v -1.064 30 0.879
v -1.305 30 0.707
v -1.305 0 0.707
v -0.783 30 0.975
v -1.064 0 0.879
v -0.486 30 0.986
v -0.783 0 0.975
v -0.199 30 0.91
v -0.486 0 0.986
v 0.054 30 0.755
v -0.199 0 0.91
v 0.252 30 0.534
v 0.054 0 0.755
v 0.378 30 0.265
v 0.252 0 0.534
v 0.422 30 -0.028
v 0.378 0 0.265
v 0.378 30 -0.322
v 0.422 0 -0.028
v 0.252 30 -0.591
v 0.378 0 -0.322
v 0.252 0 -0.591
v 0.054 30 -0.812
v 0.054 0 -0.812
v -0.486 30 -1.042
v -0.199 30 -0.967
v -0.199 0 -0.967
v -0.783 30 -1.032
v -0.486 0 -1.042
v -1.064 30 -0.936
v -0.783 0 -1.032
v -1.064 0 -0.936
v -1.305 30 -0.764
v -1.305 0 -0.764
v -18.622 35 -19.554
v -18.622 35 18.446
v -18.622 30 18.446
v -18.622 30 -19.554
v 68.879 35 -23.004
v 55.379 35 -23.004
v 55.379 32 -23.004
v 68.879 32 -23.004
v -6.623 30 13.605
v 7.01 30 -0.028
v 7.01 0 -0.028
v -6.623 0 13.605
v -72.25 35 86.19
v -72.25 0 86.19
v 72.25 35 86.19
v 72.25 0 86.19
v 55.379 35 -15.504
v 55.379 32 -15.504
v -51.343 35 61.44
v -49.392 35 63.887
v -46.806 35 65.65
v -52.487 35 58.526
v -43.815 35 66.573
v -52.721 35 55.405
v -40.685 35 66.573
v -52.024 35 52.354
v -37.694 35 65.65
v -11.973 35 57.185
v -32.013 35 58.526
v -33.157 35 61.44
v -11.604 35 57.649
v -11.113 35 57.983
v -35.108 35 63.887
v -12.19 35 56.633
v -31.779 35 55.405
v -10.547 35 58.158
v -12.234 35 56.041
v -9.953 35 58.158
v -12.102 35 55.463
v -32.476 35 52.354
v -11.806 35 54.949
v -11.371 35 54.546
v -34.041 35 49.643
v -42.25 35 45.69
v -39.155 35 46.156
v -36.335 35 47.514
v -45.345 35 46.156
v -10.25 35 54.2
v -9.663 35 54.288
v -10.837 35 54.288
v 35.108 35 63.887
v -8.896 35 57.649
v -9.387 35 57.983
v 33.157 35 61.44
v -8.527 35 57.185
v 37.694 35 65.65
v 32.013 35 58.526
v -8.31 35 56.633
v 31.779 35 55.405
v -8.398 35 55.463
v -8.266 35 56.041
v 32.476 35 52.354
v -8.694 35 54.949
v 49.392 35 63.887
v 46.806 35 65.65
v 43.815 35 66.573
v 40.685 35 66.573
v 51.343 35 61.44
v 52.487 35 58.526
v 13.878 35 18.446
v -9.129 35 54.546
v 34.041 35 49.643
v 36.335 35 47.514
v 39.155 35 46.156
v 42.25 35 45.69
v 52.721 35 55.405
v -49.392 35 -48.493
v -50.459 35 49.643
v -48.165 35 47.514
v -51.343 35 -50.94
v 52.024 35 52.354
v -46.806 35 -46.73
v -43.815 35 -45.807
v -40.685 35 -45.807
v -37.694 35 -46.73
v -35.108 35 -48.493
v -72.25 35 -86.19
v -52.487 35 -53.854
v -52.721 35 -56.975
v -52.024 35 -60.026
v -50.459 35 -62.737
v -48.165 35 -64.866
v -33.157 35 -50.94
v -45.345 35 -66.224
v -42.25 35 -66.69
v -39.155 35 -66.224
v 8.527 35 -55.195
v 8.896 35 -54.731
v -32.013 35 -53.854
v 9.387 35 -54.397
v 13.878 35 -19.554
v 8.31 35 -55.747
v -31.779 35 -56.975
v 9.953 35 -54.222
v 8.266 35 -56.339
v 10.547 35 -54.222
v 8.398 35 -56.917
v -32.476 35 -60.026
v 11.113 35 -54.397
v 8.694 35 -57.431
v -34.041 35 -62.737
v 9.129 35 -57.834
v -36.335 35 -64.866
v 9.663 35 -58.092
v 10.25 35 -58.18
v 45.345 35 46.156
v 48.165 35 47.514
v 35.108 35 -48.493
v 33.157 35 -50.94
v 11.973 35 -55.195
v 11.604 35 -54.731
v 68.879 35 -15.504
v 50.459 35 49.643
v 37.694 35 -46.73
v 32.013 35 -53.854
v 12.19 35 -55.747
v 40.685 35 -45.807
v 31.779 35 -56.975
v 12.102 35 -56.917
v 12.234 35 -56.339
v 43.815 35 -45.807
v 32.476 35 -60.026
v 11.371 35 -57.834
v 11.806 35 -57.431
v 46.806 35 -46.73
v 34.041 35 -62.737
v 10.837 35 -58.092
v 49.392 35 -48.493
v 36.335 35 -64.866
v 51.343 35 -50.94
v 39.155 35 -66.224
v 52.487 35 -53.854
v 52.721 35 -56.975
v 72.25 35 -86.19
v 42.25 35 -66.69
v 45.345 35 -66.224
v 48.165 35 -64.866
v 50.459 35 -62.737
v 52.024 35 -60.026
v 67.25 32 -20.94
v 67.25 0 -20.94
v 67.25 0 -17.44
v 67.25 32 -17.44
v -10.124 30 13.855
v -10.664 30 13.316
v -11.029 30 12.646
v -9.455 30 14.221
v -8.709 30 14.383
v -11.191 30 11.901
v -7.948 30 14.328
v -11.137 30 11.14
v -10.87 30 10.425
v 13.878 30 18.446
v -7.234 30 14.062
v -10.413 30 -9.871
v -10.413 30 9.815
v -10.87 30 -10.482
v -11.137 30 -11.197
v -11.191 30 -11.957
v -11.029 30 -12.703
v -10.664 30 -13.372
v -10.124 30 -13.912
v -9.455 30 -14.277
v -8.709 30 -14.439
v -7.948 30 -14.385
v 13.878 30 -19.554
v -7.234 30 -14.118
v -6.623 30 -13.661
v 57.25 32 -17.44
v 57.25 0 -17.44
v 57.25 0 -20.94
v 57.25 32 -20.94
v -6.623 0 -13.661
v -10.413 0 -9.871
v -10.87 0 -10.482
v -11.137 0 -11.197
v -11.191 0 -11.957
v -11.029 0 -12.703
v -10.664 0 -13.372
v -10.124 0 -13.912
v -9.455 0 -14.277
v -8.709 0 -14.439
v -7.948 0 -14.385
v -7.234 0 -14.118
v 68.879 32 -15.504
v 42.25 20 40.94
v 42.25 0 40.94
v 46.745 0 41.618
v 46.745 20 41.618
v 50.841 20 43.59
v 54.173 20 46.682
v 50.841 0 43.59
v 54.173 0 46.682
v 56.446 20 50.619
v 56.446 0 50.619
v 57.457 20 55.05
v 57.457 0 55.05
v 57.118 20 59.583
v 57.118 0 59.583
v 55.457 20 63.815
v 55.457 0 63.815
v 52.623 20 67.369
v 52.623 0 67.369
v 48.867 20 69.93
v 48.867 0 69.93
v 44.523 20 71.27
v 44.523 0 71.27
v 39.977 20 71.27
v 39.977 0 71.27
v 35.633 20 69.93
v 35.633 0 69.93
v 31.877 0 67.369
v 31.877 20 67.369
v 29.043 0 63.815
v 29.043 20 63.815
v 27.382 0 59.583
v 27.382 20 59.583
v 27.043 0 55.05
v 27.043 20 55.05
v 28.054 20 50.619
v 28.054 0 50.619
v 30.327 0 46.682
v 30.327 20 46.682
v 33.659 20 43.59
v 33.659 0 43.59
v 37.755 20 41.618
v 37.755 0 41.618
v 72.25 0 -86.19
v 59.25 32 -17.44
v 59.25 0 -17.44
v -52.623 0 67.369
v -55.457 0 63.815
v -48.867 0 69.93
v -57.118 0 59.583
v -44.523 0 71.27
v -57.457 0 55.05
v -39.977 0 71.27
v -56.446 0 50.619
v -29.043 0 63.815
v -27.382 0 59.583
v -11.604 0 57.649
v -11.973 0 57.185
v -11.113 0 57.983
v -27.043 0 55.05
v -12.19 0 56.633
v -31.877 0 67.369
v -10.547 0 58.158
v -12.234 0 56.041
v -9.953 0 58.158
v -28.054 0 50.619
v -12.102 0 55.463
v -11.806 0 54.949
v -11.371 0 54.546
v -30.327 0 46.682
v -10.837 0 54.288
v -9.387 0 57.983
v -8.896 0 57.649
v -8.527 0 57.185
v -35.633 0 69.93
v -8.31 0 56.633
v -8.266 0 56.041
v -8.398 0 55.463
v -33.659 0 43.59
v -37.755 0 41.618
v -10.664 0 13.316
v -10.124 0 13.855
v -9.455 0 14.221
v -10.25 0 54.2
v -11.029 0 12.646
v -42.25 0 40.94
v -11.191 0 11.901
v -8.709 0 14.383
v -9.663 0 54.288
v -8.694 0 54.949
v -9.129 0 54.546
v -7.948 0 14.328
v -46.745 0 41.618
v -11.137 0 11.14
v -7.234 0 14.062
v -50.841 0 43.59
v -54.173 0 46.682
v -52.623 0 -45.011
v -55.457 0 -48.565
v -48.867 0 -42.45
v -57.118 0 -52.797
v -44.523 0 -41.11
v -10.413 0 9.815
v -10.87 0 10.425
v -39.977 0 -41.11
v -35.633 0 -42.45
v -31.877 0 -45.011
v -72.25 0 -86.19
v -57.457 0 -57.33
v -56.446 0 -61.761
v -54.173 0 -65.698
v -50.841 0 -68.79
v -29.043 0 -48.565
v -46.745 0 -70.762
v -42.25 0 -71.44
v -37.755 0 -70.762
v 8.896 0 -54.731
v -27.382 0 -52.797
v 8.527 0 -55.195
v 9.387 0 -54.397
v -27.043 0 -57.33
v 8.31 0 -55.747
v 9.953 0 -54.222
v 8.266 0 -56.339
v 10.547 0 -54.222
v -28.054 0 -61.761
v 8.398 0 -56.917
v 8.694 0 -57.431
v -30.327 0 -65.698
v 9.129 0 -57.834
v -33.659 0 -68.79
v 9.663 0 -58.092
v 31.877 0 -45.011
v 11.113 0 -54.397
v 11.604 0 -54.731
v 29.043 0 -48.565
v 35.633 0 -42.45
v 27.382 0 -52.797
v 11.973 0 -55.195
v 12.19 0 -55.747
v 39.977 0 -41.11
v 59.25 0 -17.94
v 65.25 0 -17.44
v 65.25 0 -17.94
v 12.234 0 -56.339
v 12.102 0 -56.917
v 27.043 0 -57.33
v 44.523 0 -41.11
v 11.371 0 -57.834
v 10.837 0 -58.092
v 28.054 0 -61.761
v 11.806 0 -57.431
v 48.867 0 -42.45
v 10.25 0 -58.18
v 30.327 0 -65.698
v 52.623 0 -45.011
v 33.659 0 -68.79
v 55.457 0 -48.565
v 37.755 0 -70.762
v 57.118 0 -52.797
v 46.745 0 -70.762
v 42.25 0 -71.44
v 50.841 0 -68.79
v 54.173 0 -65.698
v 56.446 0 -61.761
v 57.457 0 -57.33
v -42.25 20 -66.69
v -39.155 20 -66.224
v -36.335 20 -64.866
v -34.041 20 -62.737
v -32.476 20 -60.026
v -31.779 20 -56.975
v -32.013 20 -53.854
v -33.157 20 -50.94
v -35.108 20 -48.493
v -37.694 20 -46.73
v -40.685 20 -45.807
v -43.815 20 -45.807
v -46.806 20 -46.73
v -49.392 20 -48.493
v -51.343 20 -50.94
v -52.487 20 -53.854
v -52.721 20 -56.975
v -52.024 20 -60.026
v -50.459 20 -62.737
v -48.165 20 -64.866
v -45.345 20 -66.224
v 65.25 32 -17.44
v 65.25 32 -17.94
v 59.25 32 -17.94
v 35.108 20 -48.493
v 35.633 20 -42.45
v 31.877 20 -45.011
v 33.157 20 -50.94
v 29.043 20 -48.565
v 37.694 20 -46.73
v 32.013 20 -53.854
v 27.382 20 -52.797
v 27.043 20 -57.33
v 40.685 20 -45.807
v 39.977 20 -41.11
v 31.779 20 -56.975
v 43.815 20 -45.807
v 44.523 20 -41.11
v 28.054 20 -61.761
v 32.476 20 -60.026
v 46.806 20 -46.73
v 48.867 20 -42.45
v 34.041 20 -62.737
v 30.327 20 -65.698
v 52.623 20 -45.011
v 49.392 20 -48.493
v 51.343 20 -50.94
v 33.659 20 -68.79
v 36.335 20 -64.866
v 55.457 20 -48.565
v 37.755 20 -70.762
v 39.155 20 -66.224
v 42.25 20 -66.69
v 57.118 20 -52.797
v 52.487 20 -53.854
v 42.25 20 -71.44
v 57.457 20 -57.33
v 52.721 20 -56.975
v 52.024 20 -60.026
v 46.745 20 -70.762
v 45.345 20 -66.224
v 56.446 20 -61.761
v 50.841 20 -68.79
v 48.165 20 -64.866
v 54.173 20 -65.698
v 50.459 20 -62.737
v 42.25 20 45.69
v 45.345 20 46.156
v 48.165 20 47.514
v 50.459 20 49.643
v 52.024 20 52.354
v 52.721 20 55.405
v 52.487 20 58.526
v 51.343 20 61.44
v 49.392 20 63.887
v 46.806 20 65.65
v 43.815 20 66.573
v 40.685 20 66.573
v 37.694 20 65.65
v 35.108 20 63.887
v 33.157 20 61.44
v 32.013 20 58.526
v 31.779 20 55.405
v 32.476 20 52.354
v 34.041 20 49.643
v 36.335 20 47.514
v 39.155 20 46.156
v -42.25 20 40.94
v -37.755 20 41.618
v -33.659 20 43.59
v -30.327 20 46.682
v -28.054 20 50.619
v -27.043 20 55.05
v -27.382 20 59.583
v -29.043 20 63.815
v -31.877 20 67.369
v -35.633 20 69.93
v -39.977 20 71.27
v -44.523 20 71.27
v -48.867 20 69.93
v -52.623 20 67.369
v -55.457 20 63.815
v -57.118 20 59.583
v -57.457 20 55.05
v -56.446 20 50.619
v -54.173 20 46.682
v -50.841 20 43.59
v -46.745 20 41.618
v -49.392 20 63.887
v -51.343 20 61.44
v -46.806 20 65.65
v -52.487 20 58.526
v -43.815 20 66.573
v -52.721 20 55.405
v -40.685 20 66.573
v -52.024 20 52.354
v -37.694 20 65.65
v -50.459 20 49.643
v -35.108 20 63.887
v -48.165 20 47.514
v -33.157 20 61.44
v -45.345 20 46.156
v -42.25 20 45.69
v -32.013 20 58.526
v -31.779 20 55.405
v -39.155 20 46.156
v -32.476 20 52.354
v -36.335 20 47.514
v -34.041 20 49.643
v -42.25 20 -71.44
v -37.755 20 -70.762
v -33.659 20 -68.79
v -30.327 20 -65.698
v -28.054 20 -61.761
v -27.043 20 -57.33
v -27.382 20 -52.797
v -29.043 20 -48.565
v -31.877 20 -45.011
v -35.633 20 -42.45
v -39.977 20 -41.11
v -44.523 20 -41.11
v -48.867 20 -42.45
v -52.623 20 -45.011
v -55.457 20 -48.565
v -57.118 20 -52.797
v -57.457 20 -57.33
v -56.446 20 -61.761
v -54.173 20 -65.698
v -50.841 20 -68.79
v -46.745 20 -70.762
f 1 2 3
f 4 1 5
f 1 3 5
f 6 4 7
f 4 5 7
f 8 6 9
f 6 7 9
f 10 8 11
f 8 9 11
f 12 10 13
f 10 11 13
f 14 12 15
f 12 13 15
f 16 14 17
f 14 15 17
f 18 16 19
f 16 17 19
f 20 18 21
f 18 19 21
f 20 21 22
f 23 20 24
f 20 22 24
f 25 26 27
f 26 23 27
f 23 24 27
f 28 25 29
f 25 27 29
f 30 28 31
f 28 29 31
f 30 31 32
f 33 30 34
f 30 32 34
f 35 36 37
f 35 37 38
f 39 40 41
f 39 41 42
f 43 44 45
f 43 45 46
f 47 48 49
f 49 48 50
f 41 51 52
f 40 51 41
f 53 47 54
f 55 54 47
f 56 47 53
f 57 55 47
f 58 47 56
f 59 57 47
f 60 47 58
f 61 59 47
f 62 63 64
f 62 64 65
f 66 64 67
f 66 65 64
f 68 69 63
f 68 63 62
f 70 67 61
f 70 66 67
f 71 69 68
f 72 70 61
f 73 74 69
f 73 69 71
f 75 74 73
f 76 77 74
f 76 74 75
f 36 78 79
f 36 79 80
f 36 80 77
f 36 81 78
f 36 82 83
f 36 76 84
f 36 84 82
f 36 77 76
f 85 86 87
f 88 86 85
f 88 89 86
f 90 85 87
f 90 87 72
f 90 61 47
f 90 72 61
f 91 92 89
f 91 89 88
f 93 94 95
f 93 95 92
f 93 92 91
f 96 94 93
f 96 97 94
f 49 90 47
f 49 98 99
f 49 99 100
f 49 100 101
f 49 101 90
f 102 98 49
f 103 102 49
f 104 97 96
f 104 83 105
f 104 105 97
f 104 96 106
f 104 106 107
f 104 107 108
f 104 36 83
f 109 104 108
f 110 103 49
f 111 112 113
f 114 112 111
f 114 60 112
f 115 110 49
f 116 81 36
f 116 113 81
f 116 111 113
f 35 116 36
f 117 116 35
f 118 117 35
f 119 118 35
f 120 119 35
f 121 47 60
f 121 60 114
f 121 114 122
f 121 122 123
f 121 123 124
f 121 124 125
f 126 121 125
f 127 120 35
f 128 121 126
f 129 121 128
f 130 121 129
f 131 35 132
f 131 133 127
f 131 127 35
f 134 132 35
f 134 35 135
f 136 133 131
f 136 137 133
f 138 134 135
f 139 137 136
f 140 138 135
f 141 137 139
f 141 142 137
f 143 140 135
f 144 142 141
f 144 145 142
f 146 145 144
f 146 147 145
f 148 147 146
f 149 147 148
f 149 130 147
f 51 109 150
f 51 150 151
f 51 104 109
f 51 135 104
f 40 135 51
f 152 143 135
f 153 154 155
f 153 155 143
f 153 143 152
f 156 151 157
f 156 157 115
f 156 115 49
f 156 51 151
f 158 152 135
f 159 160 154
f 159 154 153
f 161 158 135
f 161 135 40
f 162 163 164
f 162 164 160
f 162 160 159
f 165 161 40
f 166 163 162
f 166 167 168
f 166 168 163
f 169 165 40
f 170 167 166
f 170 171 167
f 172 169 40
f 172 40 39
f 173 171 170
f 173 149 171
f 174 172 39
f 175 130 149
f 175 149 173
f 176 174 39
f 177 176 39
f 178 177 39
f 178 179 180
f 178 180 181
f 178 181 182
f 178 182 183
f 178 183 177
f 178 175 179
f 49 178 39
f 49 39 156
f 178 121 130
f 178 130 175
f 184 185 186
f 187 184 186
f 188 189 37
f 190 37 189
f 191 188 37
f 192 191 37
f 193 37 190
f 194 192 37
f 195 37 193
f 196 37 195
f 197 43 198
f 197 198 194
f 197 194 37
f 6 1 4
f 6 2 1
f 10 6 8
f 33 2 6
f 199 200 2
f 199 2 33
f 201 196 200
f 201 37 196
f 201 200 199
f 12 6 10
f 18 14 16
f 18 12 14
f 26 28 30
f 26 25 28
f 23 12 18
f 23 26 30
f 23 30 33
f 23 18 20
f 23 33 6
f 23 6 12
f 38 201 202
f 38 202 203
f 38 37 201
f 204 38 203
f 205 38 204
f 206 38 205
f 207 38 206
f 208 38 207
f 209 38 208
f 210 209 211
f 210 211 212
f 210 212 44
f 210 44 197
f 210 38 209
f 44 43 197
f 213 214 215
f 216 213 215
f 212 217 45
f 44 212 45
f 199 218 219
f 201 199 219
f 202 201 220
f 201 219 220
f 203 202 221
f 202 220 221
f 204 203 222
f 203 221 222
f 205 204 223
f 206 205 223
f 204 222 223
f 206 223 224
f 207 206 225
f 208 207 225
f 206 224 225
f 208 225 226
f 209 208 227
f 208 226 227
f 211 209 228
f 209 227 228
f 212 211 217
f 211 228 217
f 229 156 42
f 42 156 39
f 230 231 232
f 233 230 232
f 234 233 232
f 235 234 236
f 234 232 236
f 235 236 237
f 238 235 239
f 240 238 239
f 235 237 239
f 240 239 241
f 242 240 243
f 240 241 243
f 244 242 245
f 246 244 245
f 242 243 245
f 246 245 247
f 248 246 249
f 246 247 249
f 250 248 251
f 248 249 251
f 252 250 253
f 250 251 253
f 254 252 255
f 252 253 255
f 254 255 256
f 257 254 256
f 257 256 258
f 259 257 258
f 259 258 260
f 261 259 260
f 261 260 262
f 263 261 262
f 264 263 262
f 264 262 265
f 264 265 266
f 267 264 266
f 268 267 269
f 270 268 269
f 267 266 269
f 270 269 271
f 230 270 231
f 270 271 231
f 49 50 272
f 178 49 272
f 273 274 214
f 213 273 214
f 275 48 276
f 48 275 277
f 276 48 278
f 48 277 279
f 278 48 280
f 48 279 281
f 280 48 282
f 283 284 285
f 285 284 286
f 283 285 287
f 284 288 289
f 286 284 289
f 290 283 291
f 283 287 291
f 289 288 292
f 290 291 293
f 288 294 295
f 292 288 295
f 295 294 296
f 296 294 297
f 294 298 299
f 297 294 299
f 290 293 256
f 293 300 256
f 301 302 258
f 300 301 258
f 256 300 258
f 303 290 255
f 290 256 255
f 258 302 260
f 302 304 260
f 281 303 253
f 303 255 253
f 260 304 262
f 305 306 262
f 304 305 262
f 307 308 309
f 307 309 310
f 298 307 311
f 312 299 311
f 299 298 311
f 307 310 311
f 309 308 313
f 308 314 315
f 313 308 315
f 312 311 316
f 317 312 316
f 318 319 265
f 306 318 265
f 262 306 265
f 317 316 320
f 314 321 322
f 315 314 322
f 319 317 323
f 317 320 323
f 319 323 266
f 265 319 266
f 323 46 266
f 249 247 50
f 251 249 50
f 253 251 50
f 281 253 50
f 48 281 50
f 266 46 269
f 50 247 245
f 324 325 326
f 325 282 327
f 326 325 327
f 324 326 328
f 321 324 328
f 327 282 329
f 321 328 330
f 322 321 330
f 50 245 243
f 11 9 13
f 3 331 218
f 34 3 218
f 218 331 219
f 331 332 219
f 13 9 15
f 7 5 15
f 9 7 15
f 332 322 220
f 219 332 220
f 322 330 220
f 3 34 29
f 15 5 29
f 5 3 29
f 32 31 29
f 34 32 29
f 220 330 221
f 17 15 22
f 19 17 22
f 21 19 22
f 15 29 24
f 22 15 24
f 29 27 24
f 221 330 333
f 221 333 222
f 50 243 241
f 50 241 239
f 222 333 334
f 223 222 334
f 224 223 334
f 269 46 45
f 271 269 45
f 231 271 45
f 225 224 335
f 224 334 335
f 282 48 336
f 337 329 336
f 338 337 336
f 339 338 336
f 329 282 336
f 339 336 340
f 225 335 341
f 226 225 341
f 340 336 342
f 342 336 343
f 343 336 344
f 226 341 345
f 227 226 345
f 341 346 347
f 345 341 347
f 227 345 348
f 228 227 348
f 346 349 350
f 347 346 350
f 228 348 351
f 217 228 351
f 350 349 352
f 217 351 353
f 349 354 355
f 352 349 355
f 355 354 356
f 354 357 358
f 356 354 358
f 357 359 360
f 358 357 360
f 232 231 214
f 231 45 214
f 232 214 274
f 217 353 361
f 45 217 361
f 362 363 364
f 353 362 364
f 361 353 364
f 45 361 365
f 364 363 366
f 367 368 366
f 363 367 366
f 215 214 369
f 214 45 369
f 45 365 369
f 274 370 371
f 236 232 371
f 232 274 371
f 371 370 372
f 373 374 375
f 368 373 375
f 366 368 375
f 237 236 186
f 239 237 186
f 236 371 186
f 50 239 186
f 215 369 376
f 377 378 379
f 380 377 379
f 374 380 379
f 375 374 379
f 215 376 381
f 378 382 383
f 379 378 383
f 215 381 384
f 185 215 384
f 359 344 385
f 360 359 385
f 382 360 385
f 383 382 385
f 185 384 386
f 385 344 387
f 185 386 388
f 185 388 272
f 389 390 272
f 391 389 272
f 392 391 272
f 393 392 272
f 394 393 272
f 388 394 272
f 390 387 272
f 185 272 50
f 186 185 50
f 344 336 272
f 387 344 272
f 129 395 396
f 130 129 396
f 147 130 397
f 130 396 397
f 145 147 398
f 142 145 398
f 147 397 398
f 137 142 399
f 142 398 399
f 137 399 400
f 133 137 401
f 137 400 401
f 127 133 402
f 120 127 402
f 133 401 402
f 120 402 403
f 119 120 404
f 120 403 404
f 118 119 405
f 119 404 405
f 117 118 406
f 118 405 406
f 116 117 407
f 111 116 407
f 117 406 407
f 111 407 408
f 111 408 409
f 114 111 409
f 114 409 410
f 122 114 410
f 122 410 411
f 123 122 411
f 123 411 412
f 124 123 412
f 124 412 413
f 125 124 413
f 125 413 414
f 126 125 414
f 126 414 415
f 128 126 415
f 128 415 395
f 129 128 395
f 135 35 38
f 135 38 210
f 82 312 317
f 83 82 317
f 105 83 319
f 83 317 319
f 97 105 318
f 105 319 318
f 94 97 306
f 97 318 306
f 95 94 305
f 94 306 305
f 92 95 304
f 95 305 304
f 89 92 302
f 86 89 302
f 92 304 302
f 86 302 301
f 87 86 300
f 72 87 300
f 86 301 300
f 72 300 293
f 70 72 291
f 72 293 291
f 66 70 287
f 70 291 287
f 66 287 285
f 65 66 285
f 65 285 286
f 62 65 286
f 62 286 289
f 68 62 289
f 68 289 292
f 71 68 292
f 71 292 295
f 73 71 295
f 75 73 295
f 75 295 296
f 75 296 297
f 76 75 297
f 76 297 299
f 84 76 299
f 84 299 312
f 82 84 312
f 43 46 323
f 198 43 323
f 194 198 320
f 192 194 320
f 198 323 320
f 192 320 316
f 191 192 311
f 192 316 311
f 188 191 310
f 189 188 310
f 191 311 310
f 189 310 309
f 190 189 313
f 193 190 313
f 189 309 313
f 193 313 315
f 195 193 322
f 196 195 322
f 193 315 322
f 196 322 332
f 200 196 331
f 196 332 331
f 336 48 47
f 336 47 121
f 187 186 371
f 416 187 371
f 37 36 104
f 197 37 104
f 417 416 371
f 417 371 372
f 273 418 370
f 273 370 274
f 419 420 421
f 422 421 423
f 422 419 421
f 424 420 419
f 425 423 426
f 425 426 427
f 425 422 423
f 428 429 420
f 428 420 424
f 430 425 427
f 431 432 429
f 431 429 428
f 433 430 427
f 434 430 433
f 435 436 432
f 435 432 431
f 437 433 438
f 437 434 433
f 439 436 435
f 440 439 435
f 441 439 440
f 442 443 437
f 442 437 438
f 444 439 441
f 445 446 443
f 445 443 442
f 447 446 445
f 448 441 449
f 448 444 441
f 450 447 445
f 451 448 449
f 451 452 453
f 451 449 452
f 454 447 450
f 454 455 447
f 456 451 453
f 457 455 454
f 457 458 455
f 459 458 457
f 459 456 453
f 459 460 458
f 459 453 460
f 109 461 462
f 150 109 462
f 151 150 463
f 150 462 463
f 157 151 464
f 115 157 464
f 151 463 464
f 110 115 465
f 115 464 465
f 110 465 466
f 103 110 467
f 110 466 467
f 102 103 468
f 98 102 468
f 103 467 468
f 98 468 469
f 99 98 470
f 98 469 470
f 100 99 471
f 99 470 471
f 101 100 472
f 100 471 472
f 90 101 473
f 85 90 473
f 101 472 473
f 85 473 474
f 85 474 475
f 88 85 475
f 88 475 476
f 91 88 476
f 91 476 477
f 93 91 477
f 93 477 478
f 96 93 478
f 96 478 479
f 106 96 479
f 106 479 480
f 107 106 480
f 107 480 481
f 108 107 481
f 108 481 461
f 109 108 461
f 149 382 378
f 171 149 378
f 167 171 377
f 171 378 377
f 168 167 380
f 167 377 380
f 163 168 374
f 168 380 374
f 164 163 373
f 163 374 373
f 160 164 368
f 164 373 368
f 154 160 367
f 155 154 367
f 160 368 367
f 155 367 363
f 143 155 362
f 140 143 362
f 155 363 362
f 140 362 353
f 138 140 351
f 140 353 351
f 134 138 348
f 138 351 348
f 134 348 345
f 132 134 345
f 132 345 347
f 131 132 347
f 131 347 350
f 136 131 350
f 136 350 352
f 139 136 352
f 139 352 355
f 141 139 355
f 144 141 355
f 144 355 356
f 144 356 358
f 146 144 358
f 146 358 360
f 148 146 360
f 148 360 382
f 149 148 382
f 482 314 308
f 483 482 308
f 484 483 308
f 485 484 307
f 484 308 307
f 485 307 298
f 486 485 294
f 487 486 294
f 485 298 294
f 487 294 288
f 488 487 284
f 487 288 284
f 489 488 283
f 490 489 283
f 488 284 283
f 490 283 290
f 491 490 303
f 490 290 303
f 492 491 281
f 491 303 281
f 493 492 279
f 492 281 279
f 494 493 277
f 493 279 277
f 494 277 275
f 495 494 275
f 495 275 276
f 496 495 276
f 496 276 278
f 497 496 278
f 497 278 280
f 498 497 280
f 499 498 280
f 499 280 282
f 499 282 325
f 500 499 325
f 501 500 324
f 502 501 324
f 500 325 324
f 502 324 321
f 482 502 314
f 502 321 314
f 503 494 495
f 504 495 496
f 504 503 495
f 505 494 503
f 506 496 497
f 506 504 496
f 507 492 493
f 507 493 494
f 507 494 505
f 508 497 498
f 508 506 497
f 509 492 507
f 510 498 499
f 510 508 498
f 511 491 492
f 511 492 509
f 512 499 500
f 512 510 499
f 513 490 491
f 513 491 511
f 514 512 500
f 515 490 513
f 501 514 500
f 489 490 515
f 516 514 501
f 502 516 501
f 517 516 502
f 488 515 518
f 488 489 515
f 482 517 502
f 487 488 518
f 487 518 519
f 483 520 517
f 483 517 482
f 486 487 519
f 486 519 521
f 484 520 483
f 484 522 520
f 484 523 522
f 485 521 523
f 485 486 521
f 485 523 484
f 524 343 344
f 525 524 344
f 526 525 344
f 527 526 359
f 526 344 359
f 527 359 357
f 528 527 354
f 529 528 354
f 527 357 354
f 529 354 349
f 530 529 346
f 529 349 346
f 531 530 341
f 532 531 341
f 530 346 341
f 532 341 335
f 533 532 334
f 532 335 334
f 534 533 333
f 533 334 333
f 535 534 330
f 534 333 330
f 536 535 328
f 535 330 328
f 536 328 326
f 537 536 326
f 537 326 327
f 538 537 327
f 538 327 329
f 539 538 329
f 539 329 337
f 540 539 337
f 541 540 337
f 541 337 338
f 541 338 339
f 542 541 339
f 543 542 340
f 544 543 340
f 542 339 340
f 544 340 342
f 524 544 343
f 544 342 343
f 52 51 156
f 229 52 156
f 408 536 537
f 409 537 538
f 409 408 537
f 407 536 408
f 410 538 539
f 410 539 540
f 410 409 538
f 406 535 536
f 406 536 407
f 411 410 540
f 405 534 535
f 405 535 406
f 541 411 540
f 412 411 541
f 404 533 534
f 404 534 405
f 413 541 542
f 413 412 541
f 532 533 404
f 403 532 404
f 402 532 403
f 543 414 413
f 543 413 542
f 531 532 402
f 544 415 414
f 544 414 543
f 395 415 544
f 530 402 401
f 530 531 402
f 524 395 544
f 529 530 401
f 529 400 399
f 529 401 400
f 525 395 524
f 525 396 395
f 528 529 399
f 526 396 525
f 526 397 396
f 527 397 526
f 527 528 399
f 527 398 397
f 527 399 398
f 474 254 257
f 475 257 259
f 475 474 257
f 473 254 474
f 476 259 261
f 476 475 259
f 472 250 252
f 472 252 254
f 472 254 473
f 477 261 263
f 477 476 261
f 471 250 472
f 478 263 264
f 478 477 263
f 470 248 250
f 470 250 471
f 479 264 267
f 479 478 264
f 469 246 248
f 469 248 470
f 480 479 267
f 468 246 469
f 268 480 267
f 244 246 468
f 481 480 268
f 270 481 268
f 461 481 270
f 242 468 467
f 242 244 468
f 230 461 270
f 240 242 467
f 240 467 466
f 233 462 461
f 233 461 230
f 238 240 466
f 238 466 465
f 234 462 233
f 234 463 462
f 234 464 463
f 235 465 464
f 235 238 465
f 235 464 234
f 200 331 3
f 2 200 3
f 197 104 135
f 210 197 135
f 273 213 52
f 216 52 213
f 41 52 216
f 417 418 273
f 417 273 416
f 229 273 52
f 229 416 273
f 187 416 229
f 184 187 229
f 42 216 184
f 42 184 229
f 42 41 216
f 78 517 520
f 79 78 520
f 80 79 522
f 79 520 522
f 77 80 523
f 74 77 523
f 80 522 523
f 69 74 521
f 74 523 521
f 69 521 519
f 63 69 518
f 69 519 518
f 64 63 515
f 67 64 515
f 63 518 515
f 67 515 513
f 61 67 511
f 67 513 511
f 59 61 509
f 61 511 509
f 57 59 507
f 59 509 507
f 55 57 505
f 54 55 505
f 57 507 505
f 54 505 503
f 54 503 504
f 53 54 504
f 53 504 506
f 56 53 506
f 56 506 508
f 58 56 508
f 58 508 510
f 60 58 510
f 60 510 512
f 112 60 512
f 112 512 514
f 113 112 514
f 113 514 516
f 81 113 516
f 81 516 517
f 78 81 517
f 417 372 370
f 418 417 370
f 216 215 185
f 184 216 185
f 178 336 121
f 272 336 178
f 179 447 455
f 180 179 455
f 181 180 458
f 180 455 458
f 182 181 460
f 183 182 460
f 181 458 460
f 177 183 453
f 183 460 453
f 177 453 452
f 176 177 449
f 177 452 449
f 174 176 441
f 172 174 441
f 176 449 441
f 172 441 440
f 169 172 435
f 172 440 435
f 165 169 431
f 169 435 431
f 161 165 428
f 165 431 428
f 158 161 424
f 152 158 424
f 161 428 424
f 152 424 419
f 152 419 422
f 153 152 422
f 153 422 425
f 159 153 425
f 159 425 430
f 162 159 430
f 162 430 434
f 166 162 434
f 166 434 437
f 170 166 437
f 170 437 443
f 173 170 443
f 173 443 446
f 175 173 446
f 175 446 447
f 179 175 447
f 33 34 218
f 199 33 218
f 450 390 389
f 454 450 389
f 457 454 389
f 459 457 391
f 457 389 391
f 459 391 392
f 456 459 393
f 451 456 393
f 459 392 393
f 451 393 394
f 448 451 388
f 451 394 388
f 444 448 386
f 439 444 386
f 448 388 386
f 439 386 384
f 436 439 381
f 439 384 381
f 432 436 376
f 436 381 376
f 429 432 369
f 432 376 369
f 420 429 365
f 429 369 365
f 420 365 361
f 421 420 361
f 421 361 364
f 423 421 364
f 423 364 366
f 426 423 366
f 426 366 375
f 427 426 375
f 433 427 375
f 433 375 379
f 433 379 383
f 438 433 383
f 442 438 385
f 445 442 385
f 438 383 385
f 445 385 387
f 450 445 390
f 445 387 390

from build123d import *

# Parameters (mm, degrees)
SKETCH1_W           = 144.5
SKETCH1_H           = 172.38
BOSS_EXTRUDE1_DEPTH = 35
SKETCH2_R           = 10.5
SKETCH2_R_2         = 1.99
CUT_EXTRUDE1_DEPTH  = 118.787005226
SKETCH3_R           = 15.25
CUT_EXTRUDE2_DEPTH  = 20
SKETCH4_W           = 32.5
SKETCH4_H           = 38
CUT_EXTRUDE3_DEPTH  = 5
SKETCH5_W           = 13.5
SKETCH5_H           = 7.5
CUT_EXTRUDE4_DEPTH  = 3
CUT_EXTRUDE5_DEPTH  = 80


with BuildPart() as part:
    # Sketch1 → Boss-Extrude1 (new body)
    with BuildSketch(Plane(origin=(0, 0, 0), x_dir=(1, 0, 0), z_dir=(0, 1, 0))):
        Rectangle(SKETCH1_W, SKETCH1_H)
    extrude(amount=BOSS_EXTRUDE1_DEPTH)

    # Sketch2 → Cut-Extrude1 (cut, through all)
    with BuildSketch(Plane.XZ):
        with Locations(Location((-42.25, -56.19, 0), (0, 0, 270))):
            Circle(SKETCH2_R)
        with Locations(Location((10.25, -56.19, 0), (0, 0, 270))):
            Circle(SKETCH2_R_2)
        with Locations(Location((42.25, -56.19, 0), (0, 0, 270))):
            Circle(SKETCH2_R)
        with Locations(Location((-10.25, 56.19, 0), (0, 0, 270))):
            Circle(SKETCH2_R_2)
        with Locations(Location((-42.25, 56.19, 0), (0, 0, 270))):
            Circle(SKETCH2_R)
        with Locations(Location((42.25, 56.19, 0), (0, 0, 270))):
            Circle(SKETCH2_R)
        Polygon((57.25, -20.94), (67.25, -20.94), (67.25, -17.44), (65.25, -17.44), (65.25, -17.94), (59.25, -17.94), (59.25, -17.44), (57.25, -17.44), align=None)
    extrude(amount=-CUT_EXTRUDE1_DEPTH, mode=Mode.SUBTRACT)

    # Sketch3 → Cut-Extrude2 (cut)
    with BuildSketch(Plane.XZ):
        with Locations(Location((-42.25, -56.19, 0), (0, 0, 270))):
            Circle(SKETCH3_R)
        with Locations(Location((42.25, -56.19, 0), (0, 0, 270))):
            Circle(SKETCH3_R)
        with Locations(Location((-42.25, 56.19, 0), (0, 0, 270))):
            Circle(SKETCH3_R)
        with Locations(Location((42.25, 56.19, 0), (0, 0, 270))):
            Circle(SKETCH3_R)
    extrude(amount=-CUT_EXTRUDE2_DEPTH, mode=Mode.SUBTRACT)

    # Sketch4 → Cut-Extrude3 (cut)
    with BuildSketch(Plane(origin=(0, 35, 0), x_dir=(1, 0, 0), z_dir=(0, 1, 0))):
        with Locations((-2.371711624, 0.554154498)):
            Rectangle(SKETCH4_W, SKETCH4_H)
    extrude(amount=-CUT_EXTRUDE3_DEPTH, mode=Mode.SUBTRACT)

    # Sketch5 → Cut-Extrude4 (cut)
    with BuildSketch(Plane(origin=(0, 35, 0), x_dir=(1, 0, 0), z_dir=(0, 1, 0))):
        with Locations((62.129216634, 19.25371769)):
            Rectangle(SKETCH5_W, SKETCH5_H)
    extrude(amount=-CUT_EXTRUDE4_DEPTH, mode=Mode.SUBTRACT)

    # Sketch6 → Cut-Extrude5 (cut)
    with BuildSketch(Plane.XZ):
        with BuildLine():
            Line((-1.305437085, -0.763536662), (-10.413111088, -9.871210665))
            ThreePointArc((-10.413111088, -9.871210665), (-10.413111088, -13.661303013), (-6.623018741, -13.661303013))
            Line((-6.623018741, -13.661303013), (7.01, -0.028284271))
            Line((7.01, -0.028284271), (-6.623018741, 13.60473447))
            ThreePointArc((-6.623018741, 13.60473447), (-10.413111088, 13.60473447), (-10.413111088, 9.814642123))
            Line((-10.413111088, 9.814642123), (-1.305437085, 0.706968119))
            ThreePointArc((-1.305437085, 0.706968119), (0.421531034, -0.028284271), (-1.305437085, -0.763536662))
        make_face()
    extrude(amount=-CUT_EXTRUDE5_DEPTH, mode=Mode.SUBTRACT)


solid = part.part
